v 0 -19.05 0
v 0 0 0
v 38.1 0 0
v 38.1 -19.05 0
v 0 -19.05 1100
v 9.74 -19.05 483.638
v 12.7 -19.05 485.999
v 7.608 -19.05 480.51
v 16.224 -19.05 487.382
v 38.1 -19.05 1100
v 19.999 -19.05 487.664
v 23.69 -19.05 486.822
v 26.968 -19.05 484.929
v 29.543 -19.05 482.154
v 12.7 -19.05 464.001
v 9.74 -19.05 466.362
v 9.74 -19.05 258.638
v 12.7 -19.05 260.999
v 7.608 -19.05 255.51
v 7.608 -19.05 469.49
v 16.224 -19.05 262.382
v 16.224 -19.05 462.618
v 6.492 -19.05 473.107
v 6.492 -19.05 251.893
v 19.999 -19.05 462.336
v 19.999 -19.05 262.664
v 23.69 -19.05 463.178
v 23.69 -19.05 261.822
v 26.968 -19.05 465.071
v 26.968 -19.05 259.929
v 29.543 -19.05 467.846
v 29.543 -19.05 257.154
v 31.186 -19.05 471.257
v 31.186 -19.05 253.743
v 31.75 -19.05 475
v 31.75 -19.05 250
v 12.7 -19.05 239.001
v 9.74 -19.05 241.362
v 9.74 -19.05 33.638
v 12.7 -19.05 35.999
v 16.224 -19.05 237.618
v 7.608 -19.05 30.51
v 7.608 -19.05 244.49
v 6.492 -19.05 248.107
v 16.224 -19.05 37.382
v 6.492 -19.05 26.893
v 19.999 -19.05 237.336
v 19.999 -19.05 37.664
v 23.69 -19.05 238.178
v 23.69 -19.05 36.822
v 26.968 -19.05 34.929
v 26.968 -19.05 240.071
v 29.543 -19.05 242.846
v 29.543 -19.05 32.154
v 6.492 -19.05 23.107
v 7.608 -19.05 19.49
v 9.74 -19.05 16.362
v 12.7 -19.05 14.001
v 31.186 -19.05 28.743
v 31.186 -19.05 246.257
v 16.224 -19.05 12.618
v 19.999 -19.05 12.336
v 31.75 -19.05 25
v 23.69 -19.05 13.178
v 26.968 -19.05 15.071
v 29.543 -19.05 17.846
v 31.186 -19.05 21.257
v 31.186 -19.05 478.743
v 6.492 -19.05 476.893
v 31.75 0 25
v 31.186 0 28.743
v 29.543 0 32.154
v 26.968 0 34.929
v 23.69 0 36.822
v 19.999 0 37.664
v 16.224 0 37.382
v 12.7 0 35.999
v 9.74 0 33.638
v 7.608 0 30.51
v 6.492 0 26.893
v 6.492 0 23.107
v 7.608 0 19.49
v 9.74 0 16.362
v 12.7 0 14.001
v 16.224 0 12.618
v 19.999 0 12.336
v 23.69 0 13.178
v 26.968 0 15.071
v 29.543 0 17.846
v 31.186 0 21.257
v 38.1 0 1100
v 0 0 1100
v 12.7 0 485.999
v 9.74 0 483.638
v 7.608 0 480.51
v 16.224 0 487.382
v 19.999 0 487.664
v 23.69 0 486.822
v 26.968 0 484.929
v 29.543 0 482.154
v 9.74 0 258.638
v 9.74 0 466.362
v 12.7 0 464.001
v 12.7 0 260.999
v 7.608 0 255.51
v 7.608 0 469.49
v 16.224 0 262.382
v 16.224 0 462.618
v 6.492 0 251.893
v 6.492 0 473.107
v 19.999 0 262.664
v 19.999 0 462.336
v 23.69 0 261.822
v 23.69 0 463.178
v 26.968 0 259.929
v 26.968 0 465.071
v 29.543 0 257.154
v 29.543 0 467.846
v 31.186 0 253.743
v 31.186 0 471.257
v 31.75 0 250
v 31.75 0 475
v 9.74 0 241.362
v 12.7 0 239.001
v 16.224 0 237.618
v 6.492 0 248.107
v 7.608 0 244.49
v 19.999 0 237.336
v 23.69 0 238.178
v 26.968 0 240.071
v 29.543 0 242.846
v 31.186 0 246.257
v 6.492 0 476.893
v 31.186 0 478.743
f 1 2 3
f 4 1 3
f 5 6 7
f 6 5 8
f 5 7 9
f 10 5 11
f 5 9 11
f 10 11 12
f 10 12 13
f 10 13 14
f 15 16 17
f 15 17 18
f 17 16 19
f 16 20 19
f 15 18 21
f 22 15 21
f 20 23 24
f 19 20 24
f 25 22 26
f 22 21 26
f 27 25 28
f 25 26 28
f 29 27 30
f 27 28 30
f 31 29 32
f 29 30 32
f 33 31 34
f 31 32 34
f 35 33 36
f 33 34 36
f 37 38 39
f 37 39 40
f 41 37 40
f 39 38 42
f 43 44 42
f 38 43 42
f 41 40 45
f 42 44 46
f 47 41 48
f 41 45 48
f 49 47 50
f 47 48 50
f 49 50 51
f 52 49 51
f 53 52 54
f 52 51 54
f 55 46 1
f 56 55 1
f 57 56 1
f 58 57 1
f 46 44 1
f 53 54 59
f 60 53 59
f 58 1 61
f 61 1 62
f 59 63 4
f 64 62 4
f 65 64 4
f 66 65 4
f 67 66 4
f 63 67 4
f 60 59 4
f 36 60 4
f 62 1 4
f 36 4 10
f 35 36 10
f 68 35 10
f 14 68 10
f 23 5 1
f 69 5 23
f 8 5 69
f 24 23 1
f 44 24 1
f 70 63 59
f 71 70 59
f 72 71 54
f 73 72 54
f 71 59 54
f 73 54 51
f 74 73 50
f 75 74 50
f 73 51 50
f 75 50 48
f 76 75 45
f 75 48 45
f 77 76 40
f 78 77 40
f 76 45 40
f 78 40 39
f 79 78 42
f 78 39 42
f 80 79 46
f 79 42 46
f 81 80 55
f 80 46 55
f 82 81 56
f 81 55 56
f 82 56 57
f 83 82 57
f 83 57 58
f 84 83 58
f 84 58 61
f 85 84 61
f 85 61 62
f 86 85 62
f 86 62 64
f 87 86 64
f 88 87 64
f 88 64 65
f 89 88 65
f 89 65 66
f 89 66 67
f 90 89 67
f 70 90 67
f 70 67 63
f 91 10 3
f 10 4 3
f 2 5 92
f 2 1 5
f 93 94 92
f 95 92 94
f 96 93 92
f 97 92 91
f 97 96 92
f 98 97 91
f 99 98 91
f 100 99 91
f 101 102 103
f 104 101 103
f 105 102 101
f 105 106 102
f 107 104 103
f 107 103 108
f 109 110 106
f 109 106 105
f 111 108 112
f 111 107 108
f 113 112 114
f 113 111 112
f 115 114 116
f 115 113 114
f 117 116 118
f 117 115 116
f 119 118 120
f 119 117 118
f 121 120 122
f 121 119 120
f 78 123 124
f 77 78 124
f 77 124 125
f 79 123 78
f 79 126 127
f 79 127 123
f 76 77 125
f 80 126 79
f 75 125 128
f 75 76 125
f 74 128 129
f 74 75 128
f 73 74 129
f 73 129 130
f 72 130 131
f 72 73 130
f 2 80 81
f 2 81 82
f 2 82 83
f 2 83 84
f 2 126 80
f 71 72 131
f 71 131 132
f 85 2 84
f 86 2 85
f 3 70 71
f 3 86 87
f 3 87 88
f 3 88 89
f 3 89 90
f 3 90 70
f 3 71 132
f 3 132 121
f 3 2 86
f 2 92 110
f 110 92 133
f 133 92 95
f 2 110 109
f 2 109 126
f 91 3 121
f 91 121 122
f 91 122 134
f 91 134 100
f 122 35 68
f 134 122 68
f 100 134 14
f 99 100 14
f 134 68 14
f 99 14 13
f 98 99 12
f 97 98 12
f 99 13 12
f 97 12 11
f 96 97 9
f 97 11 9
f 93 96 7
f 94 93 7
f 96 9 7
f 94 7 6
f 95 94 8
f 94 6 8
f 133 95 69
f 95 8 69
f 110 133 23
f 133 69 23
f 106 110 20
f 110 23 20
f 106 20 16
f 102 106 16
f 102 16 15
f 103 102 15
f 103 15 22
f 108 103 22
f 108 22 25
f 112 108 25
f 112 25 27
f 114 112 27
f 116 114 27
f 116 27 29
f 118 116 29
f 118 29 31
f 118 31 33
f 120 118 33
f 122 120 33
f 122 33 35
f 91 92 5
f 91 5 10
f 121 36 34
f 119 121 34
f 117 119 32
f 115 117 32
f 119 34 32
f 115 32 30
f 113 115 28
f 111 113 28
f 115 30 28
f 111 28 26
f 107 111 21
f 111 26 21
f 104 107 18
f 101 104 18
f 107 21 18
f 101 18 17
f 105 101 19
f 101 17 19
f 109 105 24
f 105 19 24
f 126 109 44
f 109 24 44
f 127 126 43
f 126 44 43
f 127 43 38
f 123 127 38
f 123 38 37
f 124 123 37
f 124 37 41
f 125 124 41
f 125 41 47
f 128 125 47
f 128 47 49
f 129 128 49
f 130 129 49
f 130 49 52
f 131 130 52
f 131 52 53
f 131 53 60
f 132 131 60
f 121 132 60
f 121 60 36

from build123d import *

# Parameters (mm, degrees)
F0_W     = 38.1
F0_H     = 500
F1_DEPTH = 19.05
F2_R     = 12.7
F3_DEPTH = 25
F4_R     = 12.7
F5_DEPTH = 25
F6_W     = 38.1
F6_H     = 19.05
F7_DEPTH = 600


with BuildPart() as f1:
    # F0 (on Front) → F1 (new body)
    with BuildSketch(Plane.XZ):
        with Locations((19.05, 250)):
            Rectangle(F0_W, F0_H)
    extrude(amount=F1_DEPTH)

    # F2 (on face) → F3 (cut)
    with BuildSketch(Plane.XZ.offset(19.05)):
        with Locations((19.05, 475)):
            Circle(F2_R)
        with Locations((19.05, 25)):
            Circle(F2_R)
    extrude(amount=-F3_DEPTH, mode=Mode.SUBTRACT)

    # F4 (on face) → F5 (cut)
    with BuildSketch(Plane.XZ.offset(19.05)):
        with Locations((19.05, 250)):
            Circle(F4_R)
    extrude(amount=-F5_DEPTH, mode=Mode.SUBTRACT)

    # F6 (on face) → F7 (join)
    with BuildSketch(Plane.XY.offset(500)):
        with Locations((19.05, -9.525)):
            Rectangle(F6_W, F6_H)
    extrude(amount=F7_DEPTH)


solid = f1.part
